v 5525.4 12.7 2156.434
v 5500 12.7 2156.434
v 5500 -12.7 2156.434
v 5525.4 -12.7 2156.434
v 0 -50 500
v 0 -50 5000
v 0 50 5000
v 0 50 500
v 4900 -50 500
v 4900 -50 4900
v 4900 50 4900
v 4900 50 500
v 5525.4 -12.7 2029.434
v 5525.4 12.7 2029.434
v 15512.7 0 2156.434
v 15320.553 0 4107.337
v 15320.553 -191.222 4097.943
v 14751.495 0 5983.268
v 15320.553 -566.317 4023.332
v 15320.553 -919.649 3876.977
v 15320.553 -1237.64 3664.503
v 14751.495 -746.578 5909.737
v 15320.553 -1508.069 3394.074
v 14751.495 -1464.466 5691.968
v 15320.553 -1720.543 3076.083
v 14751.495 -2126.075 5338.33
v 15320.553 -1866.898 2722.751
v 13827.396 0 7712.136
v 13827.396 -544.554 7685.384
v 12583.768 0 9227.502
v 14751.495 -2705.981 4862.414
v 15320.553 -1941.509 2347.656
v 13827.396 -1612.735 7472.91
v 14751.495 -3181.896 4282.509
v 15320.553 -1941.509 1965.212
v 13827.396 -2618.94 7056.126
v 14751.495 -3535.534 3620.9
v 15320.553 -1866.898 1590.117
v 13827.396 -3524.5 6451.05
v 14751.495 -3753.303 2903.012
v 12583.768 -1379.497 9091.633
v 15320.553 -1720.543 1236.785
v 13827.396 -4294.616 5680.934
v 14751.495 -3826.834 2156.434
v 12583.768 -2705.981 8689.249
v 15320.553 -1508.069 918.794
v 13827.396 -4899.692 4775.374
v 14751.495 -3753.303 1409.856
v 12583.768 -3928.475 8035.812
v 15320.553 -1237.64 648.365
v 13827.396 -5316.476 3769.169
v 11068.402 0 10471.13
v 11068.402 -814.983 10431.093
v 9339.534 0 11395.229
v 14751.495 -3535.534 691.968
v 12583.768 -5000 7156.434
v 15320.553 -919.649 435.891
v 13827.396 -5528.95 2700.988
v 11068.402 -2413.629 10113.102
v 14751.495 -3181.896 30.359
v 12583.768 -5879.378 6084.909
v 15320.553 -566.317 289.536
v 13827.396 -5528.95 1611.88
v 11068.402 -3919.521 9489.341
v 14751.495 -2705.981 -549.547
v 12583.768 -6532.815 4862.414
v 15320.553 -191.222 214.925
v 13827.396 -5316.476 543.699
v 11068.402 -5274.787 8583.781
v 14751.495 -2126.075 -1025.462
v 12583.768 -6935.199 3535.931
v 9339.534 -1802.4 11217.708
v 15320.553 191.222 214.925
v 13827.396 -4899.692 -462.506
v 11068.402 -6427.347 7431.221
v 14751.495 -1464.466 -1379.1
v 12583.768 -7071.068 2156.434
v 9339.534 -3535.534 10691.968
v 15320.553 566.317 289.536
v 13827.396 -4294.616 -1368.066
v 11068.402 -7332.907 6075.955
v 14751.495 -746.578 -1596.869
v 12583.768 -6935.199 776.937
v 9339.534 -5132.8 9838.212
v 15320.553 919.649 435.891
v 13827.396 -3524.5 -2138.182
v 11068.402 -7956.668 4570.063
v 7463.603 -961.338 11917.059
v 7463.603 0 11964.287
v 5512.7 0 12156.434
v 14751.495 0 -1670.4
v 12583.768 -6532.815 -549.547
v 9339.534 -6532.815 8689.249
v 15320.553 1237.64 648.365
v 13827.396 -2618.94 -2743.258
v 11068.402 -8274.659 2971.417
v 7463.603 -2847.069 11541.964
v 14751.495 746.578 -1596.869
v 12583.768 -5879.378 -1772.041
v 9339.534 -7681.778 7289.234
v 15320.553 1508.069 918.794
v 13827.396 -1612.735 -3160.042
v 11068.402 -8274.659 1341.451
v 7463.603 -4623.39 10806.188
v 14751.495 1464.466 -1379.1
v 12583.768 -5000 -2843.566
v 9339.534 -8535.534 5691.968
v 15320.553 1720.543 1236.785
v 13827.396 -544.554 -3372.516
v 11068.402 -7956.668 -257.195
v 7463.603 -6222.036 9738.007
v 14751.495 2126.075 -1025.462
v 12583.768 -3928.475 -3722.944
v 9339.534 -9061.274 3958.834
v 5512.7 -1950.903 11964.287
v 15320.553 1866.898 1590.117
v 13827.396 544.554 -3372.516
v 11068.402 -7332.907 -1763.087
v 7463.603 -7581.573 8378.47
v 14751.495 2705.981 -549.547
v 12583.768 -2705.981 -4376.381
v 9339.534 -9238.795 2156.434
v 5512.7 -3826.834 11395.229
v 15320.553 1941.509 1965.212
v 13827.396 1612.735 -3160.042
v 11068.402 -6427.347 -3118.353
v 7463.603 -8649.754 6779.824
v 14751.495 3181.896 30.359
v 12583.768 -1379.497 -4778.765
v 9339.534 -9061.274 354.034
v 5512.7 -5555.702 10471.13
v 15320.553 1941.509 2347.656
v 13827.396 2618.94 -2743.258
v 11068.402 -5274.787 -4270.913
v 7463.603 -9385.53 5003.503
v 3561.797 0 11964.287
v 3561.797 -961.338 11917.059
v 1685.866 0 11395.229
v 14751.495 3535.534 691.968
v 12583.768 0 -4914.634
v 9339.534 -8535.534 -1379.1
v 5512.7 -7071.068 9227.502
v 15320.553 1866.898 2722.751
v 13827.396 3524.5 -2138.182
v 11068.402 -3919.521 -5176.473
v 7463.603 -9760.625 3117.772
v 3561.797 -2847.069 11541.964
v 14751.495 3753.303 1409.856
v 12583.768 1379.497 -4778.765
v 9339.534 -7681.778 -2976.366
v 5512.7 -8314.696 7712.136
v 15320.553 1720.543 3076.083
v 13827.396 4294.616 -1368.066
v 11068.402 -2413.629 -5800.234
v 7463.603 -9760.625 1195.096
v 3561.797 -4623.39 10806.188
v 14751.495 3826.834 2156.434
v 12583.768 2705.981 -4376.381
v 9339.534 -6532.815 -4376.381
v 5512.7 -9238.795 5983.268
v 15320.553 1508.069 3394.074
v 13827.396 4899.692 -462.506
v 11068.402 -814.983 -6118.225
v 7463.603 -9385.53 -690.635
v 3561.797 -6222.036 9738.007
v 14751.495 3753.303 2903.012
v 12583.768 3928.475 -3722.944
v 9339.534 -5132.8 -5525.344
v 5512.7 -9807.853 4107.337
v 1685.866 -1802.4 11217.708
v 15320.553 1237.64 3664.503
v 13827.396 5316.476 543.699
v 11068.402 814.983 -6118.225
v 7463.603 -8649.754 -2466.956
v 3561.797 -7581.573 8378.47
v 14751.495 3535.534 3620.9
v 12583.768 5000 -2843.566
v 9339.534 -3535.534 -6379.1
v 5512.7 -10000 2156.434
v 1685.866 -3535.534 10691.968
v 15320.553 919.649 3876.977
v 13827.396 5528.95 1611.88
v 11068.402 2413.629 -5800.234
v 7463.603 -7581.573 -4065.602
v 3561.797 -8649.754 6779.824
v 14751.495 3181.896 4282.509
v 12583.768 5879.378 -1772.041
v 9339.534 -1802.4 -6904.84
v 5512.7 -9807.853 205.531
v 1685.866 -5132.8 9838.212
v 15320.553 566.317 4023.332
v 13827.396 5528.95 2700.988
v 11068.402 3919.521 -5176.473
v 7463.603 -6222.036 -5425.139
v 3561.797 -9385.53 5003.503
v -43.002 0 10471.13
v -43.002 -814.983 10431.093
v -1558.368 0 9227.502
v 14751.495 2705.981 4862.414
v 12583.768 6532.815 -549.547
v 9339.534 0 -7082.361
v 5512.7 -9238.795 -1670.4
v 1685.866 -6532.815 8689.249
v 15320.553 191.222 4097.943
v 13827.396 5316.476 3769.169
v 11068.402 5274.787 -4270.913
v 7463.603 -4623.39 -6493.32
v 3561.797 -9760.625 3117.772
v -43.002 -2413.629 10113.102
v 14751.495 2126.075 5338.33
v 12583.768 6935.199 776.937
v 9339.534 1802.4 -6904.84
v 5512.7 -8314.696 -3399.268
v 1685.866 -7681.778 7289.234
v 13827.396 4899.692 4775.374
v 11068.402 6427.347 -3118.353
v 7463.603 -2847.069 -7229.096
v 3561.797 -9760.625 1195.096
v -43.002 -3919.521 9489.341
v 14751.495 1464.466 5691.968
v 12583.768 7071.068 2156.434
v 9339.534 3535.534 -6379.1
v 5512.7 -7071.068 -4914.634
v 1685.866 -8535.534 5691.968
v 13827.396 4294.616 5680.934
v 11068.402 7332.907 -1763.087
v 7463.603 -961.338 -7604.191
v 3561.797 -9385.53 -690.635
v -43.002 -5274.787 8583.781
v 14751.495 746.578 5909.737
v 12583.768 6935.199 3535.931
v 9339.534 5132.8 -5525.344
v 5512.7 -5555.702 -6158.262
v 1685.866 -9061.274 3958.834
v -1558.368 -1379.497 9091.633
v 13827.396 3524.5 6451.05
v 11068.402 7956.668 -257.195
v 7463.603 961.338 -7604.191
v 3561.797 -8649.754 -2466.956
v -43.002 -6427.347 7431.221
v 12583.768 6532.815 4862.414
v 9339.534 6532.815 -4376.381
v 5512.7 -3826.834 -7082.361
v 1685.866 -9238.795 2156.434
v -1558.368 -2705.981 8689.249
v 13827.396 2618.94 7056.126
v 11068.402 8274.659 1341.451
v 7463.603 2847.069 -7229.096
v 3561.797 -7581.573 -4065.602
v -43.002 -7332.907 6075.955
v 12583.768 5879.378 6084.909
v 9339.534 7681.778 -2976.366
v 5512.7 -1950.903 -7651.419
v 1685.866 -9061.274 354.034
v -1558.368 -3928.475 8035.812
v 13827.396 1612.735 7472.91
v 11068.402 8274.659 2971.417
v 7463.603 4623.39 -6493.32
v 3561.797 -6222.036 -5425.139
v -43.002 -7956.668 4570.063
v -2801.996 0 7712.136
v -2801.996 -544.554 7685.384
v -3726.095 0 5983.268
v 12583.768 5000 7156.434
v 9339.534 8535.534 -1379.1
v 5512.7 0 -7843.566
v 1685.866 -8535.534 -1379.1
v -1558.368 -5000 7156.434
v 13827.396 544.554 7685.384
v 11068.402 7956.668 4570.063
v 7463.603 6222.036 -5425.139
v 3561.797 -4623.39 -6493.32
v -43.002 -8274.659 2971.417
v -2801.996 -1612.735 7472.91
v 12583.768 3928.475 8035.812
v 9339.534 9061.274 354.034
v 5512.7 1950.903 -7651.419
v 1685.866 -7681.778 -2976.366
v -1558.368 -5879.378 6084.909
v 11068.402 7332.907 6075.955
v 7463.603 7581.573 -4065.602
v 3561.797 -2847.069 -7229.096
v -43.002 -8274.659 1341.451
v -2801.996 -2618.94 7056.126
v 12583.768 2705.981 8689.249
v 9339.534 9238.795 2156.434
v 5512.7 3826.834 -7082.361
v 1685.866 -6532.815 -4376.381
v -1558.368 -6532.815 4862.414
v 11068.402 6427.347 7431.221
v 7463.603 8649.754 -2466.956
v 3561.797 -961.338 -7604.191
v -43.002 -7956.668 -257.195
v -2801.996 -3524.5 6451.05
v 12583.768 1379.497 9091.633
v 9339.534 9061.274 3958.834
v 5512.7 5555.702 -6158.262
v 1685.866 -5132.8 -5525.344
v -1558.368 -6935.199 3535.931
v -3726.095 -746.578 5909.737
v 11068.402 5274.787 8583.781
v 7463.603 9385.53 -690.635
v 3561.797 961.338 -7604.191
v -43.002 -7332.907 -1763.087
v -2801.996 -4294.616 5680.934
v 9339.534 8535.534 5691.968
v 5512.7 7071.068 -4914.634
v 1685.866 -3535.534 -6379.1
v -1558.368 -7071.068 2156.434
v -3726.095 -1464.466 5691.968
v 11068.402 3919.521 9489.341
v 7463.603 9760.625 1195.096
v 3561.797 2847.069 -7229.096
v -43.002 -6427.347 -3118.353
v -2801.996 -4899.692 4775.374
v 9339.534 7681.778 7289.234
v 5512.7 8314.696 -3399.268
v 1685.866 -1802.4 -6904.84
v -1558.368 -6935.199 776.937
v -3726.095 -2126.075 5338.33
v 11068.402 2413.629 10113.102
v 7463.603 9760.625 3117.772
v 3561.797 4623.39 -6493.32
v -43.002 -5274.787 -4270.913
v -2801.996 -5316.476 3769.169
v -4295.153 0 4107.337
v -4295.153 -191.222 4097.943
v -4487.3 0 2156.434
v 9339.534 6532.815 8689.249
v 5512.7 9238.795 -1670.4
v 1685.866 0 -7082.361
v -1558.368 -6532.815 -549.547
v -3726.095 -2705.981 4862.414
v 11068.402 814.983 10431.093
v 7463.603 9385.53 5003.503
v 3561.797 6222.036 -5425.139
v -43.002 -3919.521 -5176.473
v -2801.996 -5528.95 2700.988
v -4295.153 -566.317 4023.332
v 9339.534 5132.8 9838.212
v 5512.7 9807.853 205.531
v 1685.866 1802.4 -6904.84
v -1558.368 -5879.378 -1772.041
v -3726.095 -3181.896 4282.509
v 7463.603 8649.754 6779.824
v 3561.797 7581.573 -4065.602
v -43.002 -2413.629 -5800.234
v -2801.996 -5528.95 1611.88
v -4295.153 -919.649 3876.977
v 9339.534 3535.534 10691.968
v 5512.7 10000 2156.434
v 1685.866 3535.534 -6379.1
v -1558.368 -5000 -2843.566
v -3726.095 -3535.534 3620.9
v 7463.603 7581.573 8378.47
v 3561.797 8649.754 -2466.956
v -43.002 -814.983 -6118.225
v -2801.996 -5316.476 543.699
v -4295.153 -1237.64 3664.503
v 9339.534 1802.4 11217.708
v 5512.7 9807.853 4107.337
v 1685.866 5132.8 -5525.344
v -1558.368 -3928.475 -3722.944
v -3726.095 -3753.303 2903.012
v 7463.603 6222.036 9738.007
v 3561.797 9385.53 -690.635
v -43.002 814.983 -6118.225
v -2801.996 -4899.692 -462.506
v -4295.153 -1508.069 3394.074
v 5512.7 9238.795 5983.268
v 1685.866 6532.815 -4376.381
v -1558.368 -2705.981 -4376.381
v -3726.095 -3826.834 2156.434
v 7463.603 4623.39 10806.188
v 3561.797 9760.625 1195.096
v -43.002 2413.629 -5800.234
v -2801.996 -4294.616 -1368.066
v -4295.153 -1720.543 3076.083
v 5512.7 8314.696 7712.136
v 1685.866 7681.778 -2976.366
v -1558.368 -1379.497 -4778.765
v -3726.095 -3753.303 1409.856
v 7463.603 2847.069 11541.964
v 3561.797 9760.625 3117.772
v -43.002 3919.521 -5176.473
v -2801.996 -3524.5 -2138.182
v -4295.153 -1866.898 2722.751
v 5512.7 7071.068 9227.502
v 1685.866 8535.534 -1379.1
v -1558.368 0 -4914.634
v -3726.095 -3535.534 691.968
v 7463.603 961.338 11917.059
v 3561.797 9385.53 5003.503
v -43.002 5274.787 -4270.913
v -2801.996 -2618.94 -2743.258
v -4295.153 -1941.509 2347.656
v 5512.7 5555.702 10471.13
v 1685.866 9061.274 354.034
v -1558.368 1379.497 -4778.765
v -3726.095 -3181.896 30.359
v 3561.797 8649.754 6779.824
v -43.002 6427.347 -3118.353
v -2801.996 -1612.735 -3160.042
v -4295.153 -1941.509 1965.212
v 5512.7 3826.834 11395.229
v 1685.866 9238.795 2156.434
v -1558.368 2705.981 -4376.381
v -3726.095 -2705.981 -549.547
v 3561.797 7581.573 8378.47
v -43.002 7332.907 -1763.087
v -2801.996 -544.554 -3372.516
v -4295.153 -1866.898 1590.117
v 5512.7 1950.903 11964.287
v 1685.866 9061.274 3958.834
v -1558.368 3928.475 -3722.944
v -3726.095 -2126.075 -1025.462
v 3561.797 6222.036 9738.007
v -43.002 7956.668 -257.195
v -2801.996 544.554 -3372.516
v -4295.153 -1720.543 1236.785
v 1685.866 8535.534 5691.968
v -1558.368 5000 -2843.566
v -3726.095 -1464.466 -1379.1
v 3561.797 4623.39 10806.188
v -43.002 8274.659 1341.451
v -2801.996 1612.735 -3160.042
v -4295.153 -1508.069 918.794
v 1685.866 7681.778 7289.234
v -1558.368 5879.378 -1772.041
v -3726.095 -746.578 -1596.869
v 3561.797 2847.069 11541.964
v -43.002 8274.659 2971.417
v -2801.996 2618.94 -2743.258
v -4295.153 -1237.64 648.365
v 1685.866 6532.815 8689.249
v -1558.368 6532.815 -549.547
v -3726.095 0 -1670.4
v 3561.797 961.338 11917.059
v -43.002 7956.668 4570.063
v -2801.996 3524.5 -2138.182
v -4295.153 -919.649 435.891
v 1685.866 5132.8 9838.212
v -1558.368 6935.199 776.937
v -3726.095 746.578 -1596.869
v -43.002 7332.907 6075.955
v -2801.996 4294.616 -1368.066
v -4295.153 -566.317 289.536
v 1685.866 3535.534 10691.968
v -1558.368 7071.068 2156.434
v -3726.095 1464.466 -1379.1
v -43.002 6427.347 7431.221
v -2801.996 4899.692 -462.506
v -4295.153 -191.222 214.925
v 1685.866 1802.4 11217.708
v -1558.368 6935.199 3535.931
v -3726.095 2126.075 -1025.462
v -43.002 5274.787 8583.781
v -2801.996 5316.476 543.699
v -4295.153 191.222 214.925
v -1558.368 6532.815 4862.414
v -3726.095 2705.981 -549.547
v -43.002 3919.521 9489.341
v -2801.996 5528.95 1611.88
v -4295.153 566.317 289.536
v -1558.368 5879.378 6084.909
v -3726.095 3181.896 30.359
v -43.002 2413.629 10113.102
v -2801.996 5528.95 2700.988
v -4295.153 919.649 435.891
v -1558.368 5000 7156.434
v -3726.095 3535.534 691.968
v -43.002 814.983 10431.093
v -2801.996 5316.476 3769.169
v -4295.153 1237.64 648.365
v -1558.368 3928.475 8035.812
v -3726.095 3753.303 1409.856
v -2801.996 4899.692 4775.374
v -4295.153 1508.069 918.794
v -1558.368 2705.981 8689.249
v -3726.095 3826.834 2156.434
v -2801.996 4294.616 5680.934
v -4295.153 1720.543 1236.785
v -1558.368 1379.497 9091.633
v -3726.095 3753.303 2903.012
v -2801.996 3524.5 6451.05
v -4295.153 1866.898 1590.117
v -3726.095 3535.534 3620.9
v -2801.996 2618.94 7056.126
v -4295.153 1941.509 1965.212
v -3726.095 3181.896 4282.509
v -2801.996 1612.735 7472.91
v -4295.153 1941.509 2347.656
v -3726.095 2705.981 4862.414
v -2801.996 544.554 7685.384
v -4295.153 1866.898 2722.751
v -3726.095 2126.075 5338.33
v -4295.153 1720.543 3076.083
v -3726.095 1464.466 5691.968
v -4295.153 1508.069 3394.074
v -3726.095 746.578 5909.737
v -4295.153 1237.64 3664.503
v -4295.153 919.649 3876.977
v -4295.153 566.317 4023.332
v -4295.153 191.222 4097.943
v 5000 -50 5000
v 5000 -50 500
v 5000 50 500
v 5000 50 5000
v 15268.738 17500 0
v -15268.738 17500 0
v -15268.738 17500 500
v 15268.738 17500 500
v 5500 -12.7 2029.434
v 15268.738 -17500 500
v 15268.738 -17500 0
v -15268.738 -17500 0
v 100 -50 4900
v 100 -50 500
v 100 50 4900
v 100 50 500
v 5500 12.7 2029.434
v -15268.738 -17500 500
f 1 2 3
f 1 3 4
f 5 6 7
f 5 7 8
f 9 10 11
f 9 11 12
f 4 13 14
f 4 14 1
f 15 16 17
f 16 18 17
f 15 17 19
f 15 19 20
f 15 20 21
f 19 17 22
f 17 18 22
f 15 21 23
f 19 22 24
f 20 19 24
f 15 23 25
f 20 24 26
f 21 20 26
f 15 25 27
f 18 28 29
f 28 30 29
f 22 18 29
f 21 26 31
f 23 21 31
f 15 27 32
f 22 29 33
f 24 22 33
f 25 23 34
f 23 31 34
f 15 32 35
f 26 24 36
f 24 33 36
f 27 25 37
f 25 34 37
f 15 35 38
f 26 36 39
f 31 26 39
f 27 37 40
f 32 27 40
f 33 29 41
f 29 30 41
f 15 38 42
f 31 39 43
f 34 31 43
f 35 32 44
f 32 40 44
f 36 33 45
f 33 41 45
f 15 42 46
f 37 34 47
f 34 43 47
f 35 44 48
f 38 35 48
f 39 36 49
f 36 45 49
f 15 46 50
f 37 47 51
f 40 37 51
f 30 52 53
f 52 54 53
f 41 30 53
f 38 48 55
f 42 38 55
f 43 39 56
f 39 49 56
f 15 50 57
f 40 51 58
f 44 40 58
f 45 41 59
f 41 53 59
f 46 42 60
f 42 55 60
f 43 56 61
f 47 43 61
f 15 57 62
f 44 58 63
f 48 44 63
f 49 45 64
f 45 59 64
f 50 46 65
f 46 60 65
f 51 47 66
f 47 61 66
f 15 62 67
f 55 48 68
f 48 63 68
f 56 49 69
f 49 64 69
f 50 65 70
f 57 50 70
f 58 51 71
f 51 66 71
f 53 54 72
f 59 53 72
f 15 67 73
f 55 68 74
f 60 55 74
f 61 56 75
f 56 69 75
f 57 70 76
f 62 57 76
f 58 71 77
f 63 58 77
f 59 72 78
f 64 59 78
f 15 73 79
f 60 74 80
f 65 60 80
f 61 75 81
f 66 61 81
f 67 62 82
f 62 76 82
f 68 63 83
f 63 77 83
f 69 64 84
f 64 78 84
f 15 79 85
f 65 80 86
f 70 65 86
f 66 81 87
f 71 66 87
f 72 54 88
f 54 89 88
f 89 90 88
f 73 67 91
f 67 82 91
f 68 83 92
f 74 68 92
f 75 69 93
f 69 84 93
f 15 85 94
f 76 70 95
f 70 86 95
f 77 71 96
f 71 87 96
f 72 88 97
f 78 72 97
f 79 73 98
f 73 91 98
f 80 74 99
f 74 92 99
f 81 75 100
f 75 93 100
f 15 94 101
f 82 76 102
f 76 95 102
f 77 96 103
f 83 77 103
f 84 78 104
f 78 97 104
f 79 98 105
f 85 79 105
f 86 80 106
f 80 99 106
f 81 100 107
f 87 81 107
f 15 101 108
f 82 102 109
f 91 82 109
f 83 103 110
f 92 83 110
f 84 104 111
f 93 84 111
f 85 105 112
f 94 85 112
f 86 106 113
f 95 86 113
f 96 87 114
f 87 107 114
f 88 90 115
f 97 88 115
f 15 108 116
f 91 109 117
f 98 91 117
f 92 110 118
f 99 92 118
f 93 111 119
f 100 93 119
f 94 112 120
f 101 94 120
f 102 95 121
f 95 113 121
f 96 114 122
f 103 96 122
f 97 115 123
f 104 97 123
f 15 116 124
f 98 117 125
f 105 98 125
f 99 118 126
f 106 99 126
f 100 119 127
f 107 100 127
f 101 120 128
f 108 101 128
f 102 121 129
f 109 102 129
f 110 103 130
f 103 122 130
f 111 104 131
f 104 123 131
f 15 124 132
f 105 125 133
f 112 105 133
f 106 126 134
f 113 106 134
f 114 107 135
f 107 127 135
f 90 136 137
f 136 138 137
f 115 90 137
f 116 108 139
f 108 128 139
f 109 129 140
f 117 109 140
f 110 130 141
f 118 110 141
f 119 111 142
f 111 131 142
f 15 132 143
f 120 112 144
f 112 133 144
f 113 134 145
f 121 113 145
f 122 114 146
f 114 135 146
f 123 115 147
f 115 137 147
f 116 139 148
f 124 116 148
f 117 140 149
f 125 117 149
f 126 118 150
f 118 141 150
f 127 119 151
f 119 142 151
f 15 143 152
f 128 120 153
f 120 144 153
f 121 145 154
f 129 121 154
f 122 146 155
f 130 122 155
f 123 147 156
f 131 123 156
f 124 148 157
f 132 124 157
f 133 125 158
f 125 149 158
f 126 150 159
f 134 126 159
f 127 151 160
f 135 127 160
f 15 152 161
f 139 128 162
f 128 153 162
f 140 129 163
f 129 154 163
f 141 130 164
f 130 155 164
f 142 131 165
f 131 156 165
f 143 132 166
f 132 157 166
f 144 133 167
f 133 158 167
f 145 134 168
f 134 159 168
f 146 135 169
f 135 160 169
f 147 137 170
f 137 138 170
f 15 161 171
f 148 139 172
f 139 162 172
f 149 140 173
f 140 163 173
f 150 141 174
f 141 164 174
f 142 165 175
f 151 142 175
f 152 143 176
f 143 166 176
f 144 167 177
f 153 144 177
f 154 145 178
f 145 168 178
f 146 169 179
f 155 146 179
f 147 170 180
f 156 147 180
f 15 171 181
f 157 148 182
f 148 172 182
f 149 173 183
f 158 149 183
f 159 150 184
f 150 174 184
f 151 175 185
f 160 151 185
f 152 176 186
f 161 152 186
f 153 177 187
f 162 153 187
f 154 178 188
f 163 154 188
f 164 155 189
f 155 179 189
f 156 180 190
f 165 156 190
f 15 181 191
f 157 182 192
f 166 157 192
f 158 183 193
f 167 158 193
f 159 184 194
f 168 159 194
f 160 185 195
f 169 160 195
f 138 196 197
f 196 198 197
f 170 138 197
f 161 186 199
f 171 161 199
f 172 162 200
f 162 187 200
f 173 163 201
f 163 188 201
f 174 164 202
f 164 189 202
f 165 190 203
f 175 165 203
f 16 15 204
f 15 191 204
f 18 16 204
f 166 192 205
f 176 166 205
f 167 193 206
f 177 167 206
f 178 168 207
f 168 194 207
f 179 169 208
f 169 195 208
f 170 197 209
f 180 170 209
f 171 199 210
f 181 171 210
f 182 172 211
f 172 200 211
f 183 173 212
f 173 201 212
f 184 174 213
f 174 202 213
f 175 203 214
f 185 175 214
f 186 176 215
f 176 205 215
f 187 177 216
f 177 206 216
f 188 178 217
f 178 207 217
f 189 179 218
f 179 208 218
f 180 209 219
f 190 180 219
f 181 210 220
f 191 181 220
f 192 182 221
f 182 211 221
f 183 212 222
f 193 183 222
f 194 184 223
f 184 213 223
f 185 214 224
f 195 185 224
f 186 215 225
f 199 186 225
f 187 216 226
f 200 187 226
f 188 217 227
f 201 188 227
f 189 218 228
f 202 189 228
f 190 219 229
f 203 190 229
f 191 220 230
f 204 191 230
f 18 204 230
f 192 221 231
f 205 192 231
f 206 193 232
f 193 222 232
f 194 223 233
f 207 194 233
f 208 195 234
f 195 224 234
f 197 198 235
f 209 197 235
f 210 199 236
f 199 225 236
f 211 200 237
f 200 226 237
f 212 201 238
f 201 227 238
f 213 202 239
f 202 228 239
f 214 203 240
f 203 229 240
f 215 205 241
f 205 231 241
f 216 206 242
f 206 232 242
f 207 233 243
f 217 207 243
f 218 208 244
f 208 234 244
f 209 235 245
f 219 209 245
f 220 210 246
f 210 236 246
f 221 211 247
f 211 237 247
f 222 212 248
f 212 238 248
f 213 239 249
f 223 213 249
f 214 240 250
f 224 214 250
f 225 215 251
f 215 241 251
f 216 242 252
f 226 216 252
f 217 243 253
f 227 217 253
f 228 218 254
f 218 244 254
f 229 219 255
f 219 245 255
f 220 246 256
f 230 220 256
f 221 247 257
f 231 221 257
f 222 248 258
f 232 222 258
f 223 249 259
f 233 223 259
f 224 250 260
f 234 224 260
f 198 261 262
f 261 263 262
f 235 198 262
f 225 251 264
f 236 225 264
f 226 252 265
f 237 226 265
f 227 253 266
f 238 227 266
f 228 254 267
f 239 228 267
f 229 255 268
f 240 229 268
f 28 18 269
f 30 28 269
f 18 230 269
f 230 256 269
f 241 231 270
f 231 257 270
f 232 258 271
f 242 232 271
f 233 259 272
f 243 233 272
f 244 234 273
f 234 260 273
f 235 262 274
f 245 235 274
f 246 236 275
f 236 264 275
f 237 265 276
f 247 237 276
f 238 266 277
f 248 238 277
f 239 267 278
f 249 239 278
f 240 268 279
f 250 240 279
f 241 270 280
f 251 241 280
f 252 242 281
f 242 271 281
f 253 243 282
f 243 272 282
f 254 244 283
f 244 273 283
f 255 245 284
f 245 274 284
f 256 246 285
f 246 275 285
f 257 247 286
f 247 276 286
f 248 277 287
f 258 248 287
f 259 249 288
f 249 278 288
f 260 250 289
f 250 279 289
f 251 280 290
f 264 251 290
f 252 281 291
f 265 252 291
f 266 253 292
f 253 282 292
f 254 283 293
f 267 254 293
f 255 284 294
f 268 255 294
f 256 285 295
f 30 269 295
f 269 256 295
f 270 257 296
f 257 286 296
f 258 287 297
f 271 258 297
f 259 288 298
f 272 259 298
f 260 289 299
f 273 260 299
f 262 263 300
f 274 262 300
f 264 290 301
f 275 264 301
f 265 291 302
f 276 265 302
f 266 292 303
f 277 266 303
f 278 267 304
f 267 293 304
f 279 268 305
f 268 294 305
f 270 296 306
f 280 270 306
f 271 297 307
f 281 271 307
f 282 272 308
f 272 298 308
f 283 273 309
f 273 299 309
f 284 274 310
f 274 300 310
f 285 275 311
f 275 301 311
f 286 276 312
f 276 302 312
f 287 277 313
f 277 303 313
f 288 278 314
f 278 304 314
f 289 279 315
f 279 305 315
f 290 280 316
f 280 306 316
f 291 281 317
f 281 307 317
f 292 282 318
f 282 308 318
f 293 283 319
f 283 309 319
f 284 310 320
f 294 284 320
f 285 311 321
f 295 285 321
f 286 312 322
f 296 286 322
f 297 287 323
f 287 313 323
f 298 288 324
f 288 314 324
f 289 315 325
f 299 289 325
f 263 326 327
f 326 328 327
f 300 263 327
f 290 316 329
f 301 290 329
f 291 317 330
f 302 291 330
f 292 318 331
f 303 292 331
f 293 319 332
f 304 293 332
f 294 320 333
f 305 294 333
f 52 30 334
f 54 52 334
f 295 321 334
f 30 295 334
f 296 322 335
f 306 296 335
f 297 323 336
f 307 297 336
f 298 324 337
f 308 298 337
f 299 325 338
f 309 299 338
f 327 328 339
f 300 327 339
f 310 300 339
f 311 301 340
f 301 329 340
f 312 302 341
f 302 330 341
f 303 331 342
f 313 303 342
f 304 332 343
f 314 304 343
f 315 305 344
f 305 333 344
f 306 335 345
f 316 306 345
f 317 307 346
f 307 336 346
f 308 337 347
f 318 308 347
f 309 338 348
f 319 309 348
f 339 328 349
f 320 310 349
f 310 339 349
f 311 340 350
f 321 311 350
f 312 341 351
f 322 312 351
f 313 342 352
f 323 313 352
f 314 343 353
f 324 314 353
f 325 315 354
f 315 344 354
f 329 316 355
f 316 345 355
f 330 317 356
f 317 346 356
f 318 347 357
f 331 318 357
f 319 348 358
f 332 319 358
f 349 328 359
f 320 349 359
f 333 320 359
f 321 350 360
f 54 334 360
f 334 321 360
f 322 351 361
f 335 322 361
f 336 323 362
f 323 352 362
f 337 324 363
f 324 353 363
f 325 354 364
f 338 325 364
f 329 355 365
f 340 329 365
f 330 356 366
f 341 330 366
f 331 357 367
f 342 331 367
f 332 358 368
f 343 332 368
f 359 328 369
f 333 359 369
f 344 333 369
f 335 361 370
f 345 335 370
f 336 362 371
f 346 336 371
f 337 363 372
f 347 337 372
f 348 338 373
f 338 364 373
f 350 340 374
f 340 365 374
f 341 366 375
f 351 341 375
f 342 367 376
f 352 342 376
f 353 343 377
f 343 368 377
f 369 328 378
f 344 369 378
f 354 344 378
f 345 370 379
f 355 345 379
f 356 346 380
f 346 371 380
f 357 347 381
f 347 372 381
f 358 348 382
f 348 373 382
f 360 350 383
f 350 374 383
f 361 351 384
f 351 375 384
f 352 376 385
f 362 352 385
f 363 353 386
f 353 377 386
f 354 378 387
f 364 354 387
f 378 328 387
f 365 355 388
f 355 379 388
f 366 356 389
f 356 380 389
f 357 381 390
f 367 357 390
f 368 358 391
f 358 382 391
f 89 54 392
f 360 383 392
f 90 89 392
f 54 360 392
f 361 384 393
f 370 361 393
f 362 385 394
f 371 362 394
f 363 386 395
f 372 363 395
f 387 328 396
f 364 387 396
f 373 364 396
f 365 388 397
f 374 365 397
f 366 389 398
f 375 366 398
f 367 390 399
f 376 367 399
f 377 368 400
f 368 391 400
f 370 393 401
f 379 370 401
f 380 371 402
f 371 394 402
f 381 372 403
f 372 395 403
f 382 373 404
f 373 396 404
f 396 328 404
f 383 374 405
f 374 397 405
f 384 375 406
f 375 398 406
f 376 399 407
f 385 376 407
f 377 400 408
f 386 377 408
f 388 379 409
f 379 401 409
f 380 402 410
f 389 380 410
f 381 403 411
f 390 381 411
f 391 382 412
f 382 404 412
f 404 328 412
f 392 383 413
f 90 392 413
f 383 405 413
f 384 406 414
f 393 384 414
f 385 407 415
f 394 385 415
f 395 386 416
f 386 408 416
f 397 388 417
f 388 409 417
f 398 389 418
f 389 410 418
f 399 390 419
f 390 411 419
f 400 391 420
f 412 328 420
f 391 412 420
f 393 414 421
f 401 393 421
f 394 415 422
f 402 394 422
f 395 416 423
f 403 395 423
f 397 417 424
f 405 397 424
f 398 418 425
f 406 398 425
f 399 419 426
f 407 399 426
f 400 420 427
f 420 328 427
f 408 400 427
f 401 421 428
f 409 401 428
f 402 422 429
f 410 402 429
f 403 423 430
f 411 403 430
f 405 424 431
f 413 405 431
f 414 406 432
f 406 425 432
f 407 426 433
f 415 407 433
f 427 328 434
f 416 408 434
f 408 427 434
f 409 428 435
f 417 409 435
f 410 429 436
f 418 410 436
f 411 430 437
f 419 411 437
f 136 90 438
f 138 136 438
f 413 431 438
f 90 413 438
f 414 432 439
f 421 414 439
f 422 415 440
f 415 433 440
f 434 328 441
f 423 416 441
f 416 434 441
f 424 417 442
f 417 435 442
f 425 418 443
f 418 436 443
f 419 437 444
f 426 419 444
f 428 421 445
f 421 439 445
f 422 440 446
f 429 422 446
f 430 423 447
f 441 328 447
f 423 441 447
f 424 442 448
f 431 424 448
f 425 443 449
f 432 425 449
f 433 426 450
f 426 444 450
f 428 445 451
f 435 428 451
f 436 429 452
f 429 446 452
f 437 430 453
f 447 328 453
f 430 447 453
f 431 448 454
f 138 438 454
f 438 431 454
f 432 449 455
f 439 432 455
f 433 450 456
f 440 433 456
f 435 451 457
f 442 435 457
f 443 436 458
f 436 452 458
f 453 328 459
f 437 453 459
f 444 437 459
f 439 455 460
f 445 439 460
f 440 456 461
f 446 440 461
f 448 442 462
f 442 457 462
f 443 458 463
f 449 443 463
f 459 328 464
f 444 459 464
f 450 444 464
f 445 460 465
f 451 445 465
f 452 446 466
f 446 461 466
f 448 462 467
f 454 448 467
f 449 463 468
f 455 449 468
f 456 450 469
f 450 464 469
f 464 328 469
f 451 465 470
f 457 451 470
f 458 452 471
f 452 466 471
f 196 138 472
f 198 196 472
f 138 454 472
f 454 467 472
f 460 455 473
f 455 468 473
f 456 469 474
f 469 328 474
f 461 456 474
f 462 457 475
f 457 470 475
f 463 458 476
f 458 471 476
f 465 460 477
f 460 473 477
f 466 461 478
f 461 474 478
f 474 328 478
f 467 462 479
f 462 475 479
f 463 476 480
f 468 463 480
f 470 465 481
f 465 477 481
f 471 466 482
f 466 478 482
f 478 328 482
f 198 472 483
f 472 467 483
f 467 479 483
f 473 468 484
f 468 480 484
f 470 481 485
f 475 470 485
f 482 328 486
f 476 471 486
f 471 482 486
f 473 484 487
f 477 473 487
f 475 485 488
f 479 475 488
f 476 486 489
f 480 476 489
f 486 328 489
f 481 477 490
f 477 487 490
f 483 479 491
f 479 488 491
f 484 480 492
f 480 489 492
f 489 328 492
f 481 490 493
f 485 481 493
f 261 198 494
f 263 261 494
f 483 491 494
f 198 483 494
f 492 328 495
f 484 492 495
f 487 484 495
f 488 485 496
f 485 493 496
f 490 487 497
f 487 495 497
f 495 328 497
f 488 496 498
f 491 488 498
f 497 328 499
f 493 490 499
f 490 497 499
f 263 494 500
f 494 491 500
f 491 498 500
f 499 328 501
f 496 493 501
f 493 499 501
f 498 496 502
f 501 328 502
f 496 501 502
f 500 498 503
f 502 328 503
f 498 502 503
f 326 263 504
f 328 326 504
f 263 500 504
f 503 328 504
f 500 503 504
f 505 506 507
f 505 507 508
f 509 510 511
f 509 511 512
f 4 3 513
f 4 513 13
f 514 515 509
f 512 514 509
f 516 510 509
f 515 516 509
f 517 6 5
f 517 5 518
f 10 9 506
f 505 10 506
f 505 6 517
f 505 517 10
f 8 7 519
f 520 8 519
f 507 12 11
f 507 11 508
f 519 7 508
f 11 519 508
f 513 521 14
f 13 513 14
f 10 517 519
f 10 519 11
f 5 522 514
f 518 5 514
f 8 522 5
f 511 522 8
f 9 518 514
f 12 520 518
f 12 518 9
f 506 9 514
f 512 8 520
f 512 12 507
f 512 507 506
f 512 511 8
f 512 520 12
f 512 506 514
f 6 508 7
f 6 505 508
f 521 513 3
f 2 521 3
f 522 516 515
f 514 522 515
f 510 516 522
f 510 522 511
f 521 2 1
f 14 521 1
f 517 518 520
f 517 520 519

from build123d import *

# Parameters (mm, degrees)
F1_DEPTH = 50
F0_W     = 25.4
F0_H     = 127
F2_DEPTH = 12.7
F3_W     = 30537.4760249312
F3_H     = 35000
F4_DEPTH = 500


with BuildPart() as f1:
    # F0 (on Front) → F1 (new body, symmetric)
    with BuildSketch(Plane.XZ):
        Polygon((0, 5000), (0, 0), (100, 0), (100, 4900), (4900, 4900), (4900, 0), (5000, 0), (5000, 5000), align=None)
    extrude(amount=F1_DEPTH, both=True)

    # F3 (on Top) → F4 (join)
    with BuildSketch(Plane.XY):
        Rectangle(F3_W, F3_H)
    extrude(amount=F4_DEPTH)


with BuildPart() as f2:
    # F0 (on Front) → F2 (new body, symmetric)
    with BuildSketch(Plane.XZ):
        with Locations((5512.7, 2092.933965683)):
            Rectangle(F0_W, F0_H)
    extrude(amount=F2_DEPTH, both=True)


with BuildPart() as f7:
    # F6 (on offset) → F7 (revolve)
    with BuildSketch(Plane.XZ):
        with BuildLine():
            Line((-4487.3, 2156.433965683), (15512.7, 2156.433965683))
            ThreePointArc((15512.7, 2156.433965683), (5512.7, 12156.433965683), (-4487.3, 2156.433965683))
        make_face()
    revolve(axis=Axis((5512.7, 0, 2156.433965683), (1, 0, 0)))


solid = Compound([f1.part, f2.part, f7.part])
